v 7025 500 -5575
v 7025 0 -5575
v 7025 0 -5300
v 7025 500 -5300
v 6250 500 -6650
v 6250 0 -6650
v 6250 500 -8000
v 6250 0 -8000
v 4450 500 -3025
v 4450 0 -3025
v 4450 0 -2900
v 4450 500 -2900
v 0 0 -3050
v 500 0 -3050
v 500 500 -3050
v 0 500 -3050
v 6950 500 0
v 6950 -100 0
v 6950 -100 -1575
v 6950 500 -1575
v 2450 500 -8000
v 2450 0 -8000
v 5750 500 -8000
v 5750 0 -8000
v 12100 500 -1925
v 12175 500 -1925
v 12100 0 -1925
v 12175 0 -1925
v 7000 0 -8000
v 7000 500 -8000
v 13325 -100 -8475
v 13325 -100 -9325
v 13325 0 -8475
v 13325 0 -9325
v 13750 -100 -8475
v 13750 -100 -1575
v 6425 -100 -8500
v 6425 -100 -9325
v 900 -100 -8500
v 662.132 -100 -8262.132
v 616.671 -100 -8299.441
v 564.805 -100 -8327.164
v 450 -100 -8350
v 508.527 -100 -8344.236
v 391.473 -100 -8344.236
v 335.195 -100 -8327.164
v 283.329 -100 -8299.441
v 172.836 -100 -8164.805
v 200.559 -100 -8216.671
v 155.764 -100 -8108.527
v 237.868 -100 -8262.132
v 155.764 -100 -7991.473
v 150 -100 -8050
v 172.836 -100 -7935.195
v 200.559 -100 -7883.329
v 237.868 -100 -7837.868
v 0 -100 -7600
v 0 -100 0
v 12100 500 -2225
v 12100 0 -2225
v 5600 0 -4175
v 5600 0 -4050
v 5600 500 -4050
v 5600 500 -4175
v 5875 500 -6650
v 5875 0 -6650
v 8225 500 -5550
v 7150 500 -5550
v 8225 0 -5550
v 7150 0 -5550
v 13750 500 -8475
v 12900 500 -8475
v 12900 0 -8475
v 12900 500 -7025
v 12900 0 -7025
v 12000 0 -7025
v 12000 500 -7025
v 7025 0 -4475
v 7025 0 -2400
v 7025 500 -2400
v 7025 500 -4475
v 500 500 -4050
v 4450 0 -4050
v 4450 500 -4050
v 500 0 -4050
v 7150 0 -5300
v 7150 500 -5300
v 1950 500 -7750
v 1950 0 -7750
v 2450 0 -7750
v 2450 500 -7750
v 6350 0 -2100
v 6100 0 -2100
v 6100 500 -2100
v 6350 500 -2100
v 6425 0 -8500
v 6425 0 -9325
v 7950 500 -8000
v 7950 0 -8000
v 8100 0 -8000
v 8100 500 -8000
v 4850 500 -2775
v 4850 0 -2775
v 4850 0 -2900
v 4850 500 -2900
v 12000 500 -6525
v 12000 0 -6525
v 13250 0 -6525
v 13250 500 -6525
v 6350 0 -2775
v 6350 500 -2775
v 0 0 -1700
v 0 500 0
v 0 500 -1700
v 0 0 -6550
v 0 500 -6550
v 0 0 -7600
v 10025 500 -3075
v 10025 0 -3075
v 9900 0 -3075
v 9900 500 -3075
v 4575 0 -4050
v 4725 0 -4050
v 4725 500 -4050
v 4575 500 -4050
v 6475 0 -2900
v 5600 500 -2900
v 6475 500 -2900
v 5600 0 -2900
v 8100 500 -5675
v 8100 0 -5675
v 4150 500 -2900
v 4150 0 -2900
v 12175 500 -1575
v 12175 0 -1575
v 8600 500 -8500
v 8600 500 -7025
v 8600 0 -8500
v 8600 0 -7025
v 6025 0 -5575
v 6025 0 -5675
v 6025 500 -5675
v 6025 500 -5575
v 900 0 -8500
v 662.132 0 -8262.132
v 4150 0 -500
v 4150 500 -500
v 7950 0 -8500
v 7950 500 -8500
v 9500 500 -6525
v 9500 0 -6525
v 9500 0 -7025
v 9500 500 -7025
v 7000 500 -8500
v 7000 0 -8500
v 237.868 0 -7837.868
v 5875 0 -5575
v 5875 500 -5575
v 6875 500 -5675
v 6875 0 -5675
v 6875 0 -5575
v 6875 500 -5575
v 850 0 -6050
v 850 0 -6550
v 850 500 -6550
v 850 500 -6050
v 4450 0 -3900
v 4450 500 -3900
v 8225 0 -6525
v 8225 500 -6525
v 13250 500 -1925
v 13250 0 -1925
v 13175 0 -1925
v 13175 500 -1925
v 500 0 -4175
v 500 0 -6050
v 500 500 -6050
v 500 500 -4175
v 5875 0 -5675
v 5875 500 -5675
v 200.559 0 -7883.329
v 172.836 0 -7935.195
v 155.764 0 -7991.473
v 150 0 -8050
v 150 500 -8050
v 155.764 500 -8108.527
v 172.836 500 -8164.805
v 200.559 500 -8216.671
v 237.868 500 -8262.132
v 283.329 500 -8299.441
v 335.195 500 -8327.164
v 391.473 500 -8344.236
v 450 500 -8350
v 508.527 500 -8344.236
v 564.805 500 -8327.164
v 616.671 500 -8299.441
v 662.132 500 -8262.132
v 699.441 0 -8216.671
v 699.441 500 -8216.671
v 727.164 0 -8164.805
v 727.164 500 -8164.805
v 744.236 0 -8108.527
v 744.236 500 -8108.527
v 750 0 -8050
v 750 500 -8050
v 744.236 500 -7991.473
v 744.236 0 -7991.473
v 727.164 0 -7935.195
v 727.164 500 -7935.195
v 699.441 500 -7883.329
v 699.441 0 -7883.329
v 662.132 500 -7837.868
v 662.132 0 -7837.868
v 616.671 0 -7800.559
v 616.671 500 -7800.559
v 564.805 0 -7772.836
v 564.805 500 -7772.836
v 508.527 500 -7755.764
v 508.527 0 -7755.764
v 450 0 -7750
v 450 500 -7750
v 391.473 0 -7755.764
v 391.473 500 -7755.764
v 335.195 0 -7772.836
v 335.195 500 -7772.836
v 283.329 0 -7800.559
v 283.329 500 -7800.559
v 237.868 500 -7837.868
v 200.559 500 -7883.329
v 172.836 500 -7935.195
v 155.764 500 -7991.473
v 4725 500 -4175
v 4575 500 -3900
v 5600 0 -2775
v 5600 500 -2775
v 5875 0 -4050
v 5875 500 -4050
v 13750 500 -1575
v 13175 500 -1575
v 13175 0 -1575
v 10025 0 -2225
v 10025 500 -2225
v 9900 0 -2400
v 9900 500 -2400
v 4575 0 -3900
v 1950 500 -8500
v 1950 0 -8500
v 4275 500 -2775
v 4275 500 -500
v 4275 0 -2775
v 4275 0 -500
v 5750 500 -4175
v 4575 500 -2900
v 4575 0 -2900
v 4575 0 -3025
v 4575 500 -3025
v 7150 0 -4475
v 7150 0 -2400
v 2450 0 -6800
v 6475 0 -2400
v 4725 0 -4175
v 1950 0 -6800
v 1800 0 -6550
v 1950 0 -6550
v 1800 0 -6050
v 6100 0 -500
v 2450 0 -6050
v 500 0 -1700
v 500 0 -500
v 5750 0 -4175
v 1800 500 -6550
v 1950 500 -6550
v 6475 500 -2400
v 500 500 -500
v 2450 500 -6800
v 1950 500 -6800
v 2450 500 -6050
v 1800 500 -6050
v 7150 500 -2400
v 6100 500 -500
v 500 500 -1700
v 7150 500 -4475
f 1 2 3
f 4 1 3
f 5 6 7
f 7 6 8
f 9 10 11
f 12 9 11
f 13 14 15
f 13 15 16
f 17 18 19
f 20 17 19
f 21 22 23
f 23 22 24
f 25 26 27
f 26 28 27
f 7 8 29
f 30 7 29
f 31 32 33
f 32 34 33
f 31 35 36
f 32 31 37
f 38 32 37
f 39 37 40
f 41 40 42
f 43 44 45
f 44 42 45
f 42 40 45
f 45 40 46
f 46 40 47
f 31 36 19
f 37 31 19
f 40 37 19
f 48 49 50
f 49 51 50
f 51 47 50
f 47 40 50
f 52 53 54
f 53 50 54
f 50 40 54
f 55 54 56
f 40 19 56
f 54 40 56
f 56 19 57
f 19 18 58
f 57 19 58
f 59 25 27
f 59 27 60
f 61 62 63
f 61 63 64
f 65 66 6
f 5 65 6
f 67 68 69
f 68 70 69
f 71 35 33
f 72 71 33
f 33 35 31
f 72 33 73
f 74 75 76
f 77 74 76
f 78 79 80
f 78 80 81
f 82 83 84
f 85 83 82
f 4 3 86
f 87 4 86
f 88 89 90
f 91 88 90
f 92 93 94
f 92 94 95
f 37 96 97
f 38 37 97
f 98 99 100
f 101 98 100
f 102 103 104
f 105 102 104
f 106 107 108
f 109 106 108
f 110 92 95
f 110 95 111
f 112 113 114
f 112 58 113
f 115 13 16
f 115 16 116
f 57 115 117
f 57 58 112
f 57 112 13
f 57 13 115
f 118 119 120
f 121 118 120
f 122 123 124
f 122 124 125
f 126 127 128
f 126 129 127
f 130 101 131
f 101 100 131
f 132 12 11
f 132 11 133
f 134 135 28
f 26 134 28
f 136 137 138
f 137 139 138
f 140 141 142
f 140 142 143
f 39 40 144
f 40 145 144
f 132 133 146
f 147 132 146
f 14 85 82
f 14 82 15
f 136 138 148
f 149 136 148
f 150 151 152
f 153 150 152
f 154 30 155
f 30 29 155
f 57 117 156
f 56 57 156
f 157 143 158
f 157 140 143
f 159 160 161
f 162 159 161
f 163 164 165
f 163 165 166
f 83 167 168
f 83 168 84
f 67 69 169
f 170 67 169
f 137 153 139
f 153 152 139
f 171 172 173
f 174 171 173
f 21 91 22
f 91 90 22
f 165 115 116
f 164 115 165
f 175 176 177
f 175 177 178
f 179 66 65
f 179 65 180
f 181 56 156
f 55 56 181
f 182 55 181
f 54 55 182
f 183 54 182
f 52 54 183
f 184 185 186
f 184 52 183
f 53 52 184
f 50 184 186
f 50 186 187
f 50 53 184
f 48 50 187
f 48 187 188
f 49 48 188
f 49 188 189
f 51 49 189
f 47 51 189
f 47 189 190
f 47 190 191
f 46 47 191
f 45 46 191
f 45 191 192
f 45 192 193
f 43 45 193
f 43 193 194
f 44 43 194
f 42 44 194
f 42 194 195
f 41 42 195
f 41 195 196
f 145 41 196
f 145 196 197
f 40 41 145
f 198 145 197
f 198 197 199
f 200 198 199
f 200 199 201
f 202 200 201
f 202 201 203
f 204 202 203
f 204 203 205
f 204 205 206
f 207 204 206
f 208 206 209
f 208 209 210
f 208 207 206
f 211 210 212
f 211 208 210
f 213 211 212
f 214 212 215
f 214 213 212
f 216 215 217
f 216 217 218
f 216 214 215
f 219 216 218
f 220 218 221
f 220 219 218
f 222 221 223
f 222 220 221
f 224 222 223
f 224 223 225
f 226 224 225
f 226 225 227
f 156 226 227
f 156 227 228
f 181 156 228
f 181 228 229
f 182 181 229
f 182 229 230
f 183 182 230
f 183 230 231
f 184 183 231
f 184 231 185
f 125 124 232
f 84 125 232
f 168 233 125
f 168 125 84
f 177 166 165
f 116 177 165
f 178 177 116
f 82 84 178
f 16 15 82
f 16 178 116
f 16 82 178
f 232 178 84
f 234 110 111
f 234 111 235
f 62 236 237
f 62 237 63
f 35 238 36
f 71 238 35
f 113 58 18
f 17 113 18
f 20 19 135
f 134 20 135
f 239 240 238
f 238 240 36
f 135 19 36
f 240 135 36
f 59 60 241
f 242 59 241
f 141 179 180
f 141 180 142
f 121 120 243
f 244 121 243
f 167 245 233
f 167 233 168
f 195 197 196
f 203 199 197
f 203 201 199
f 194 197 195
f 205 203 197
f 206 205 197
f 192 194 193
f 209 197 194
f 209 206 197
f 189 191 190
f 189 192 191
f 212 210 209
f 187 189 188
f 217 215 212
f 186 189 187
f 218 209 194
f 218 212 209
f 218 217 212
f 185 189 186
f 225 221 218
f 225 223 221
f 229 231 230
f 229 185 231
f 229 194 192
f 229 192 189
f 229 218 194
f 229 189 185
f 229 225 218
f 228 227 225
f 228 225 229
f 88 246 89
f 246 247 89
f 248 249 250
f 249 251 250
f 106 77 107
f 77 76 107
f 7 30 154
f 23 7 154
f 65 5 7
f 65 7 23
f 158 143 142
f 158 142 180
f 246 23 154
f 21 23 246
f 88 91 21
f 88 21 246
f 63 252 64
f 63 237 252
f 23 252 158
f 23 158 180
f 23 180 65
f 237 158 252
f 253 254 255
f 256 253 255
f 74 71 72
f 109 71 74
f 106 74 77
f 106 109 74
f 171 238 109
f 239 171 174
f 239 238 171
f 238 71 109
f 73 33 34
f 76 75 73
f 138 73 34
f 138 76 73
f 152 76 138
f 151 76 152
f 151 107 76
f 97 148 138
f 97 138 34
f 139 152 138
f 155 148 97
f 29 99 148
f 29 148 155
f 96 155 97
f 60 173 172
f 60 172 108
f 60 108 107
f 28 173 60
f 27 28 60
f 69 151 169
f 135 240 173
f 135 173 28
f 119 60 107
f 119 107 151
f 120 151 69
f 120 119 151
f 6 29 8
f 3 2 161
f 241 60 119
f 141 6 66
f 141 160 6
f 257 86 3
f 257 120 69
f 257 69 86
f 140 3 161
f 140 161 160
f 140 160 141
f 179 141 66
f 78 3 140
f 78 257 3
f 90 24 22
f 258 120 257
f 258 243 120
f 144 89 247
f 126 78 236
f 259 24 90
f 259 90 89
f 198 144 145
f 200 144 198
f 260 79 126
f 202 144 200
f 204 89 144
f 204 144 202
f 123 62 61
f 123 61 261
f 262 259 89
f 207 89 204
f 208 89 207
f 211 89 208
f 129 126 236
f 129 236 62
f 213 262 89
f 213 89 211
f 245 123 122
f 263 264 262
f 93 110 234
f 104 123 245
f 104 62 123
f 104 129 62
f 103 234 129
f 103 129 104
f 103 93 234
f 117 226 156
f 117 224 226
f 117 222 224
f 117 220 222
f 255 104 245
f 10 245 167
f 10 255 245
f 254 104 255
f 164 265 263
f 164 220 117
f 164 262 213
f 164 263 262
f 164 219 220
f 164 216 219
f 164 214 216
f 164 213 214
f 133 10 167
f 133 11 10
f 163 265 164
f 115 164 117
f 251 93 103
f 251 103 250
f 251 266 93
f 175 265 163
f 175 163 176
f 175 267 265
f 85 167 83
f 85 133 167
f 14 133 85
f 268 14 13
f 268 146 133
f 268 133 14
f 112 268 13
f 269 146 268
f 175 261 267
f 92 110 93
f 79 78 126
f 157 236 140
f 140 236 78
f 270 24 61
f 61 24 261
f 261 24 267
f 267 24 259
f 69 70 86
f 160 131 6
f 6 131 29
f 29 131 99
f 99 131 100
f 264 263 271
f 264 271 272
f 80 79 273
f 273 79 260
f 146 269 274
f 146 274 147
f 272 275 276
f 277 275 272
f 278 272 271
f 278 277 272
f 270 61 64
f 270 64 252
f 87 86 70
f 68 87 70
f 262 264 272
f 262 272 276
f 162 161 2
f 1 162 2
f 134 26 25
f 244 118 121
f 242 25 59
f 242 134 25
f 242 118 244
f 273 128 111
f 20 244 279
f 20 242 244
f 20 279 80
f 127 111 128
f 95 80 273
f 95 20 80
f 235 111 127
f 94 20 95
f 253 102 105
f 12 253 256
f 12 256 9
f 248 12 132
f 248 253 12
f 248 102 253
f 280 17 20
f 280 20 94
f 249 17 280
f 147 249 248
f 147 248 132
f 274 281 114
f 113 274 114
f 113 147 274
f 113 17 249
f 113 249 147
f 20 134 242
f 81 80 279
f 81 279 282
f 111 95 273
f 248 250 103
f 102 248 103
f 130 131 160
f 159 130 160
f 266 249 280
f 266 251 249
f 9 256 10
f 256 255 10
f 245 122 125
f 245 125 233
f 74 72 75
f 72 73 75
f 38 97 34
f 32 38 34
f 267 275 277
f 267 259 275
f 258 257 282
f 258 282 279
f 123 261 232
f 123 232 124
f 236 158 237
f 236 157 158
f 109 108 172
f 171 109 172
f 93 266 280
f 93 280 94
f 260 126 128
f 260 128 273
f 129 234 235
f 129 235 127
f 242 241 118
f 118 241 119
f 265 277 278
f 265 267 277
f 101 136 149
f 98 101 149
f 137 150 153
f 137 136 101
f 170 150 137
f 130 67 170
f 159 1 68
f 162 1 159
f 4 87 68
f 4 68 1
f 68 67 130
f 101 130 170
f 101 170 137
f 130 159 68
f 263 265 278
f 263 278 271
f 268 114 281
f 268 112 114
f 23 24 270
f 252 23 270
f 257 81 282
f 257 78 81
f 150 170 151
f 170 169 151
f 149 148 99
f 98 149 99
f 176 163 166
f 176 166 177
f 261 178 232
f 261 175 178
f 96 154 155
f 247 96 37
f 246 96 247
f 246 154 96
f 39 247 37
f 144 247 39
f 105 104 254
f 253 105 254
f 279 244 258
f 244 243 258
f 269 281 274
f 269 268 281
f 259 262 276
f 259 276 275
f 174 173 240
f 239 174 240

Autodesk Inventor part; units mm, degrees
ref_plane "YZ Plane" through (0, 0, 0) normal (1, 0, 0) x (0, 1, 0)
ref_plane "XZ Plane" through (0, 0, 0) normal (0, 1, 0) x (-1, 0, 0)
ref_plane "XY Plane" through (0, 0, 0) normal (0, 0, 1) x (1, 0, 0)
sketch "Sketch1" plane through (0, 0, 0) normal (0, 1, 0) x (-1, 0, 0)
  line L0 (0, 0) -> (-6950, 0)
  line L1 (-6950, 0) -> (-6950, -1575)
  line L2 (-13750, -1575) -> (-13750, -8475)
  line L3 (-13750, -8475) -> (-12900, -8475)
  line L4 (-12900, -8475) -> (-12900, -7025)
  line L5 (-12900, -7025) -> (-12000, -7025)
  line L6 (-12000, -7025) -> (-12000, -6525)
  line L7 (-12000, -6525) -> (-13250, -6525)
  line L8 (-13250, -6525) -> (-13250, -1925)
  line L9 (-13250, -1925) -> (-13175, -1925)
  line L10 (-13175, -1925) -> (-13175, -1575)
  line L11 (-12175, -1575) -> (-12175, -1925)
  line L12 (-12175, -1925) -> (-12100, -1925)
  line L13 (-12100, -1925) -> (-12100, -2225)
  line L14 (-12100, -2225) -> (-10025, -2225)
  line L15 (-10025, -2225) -> (-10025, -2400)
  line L16 (-10025, -2400) -> (-6350, -2400)
  line L17 (0, 0) -> (0, -1700)
  line L18 (0, -1700) -> (-500, -1700)
  line L19 (-500, -1700) -> (-500, -500)
  line L20 (-500, -500) -> (-6100, -500)
  line L21 (-6100, -500) -> (-6100, -2100)
  line L22 (-6100, -2100) -> (-6350, -2100)
  line L23 (-6350, -2100) -> (-6350, -2400)
  line L24 (0, -3050) -> (0, -6550)
  line L25 (0, -6550) -> (-850, -6550)
  line L26 (-850, -6550) -> (-850, -6050)
  line L27 (-850, -6050) -> (-500, -6050)
  line L28 (-500, -6050) -> (-500, -3050)
  line L29 (-500, -3050) -> (0, -3050)
  line L30 (-1800, -6550) -> (-1950, -6550)
  line L31 (-1950, -6550) -> (-1950, -6800)
  line L32 (-1950, -6800) -> (-2450, -6800)
  line L33 (-2450, -6800) -> (-2450, -6050)
  line L34 (-2450, -6050) -> (-1800, -6050)
  line L35 (-1800, -6050) -> (-1800, -6550)
  line L36 (-1950, -7750) -> (-2450, -7750)
  line L37 (-2450, -7750) -> (-2450, -8000)
  line L38 (-2450, -8000) -> (-5750, -8000)
  line L39 (-5750, -8000) -> (-5750, -6650)
  line L40 (-5750, -6650) -> (-6250, -6650)
  line L41 (-6250, -6650) -> (-6250, -8000)
  line L42 (-6250, -8000) -> (-7000, -8000)
  line L43 (-7000, -8000) -> (-7000, -8500)
  line L44 (-7000, -8500) -> (-1950, -8500)
  line L45 (-1950, -8500) -> (-1950, -7750)
  line L46 (-7950, -8500) -> (-7950, -8000)
  line L47 (-7950, -8000) -> (-8100, -8000)
  line L48 (-8100, -8000) -> (-8100, -6525)
  line L49 (-8100, -6525) -> (-9500, -6525)
  line L50 (-9500, -6525) -> (-9500, -7025)
  line L51 (-9500, -7025) -> (-8600, -7025)
  line L52 (-8600, -7025) -> (-8600, -8500)
  line L53 (-8600, -8500) -> (-7950, -8500)
  line L54 (-6950, -1575) -> (-12175, -1575)
  line L55 (-13175, -1575) -> (-13750, -1575)
  line L56 (-4275, -500) -> (-4275, -2775)
  line L57 (-4275, -2775) -> (-4850, -2775)
  line L58 (-4850, -2775) -> (-4850, -2900)
  line L59 (-4850, -2900) -> (-4575, -2900)
  line L60 (-4575, -2900) -> (-4575, -3025)
  line L61 (-4575, -3025) -> (-4450, -3025)
  line L62 (-4450, -3025) -> (-4450, -2900)
  line L63 (-4450, -2900) -> (-4150, -2900)
  line L64 (-4150, -2900) -> (-4150, -500)
  line L65 (-6350, -2400) -> (-6350, -2775)
  line L66 (-6350, -2775) -> (-5600, -2775)
  line L67 (-5600, -2775) -> (-5600, -2900)
  line L68 (-5600, -2900) -> (-6475, -2900)
  line L69 (-6475, -2900) -> (-6475, -2400)
  line L70 (-7025, -2400) -> (-7025, -4475)
  line L71 (-7025, -4475) -> (-7150, -4475)
  line L72 (-7150, -4475) -> (-7150, -2400)
  line L73 (-8100, -6525) -> (-8100, -5675)
  line L74 (-8100, -5675) -> (-6875, -5675)
  line L75 (-6875, -5675) -> (-6875, -5575)
  line L76 (-6875, -5575) -> (-7025, -5575)
  line L77 (-7025, -5575) -> (-7025, -5300)
  line L78 (-7025, -5300) -> (-7150, -5300)
  line L79 (-7150, -5300) -> (-7150, -5550)
  line L80 (-8225, -5550) -> (-8225, -6525)
  line L81 (-7150, -5550) -> (-8225, -5550)
  line L82 (-5875, -6650) -> (-5875, -5675)
  line L83 (-5875, -5675) -> (-6025, -5675)
  line L84 (-6025, -5675) -> (-6025, -5575)
  line L85 (-6025, -5575) -> (-5875, -5575)
  line L86 (-5875, -5575) -> (-5875, -4050)
  line L87 (-5875, -4050) -> (-5600, -4050)
  line L88 (-5600, -4050) -> (-5600, -4175)
  line L89 (-5600, -4175) -> (-5750, -4175)
  line L90 (-5750, -4175) -> (-5750, -6650)
  line L91 (-500, -4175) -> (-4725, -4175)
  line L92 (-4725, -4175) -> (-4725, -4050)
  line L93 (-4725, -4050) -> (-4575, -4050)
  line L94 (-4575, -4050) -> (-4575, -3900)
  line L95 (-4575, -3900) -> (-4450, -3900)
  line L96 (-4450, -3900) -> (-4450, -4050)
  line L97 (-4450, -4050) -> (-500, -4050)
  line L98 (-4150, -2900) -> (-4275, -2775) construction
  line L99 (-6350, -2775) -> (-6475, -2900) construction
  line L100 (-5750, -4175) -> (-5875, -4050) construction
  line L101 (0, -3050) -> (0, -1700)
  line L102 (-12175, -1575) -> (-13175, -1575)
  line L103 (-12000, -7025) -> (-9500, -7025)
  line L104 (-7000, -8500) -> (-7950, -8500)
  line L105 (0, -6550) -> (0, -7600)
  line L106 (-900, -8500) -> (-1950, -8500)
  circle A0 centre (-450, -8050) radius 300
  line L107 (0, -7600) -> (-237.868, -7837.868)
  line L108 (-662.132, -8262.132) -> (-900, -8500)
  line L109 (-850, -6050) -> (-1800, -6050)
  line L110 (-2450, -6800) -> (-2450, -7750)
  line L111 (-500, -3050) -> (-500, -1700)
  line L112 (-7000, -8000) -> (-7950, -8000)
  line L113 (-850, -6550) -> (-1800, -6550)
  line L114 (-1950, -6800) -> (-1950, -7750)
  line L115 (-9500, -6525) -> (-12000, -6525)
  line L116 (-6425, -8500) -> (-6425, -9325)
  line L117 (-6425, -9325) -> (-13325, -9325)
  line L118 (-13325, -9325) -> (-13325, -8475)
  line L119 (-13200, -8475) -> (-13200, -9200)
  line L120 (-13200, -9200) -> (-6550, -9200)
  line L121 (-6550, -9200) -> (-6550, -8500)
  line L122 (-6425, -9325) -> (-6550, -9200) construction
  line L123 (-13200, -9200) -> (-13325, -9325) construction
  line L124 (-7075, -9325) -> (-7075, -9200)
  line L125 (-8100, -5675) -> (-8225, -5550) construction
  line L126 (-10025, -2400) -> (-10025, -3075)
  line L127 (-10025, -3075) -> (-9900, -3075)
  line L128 (-9900, -3075) -> (-9900, -2400)
  dimension "d0" = 1000
  dimension "d1" = 3225
  dimension "d2" = 13250
  dimension "d4" = 1150
  dimension "d5" = 6075
  dimension "d6" = 5600
  dimension "d7" = 500
  dimension "d8" = 1350
  dimension "d9" = 1200
  dimension "d10" = 500
  dimension "d11" = 1600
  dimension "d12" = 1900
  dimension "d13" = 5850
  dimension "d14" = 6000
  dimension "d15" = 4300
  dimension "d16" = 6900
  dimension "d17" = 500
  dimension "d18" = 350
  dimension "d19" = 300
  dimension "d20" = 175
  dimension "d21" = 650
  dimension "d22" = 850
  dimension "d23" = 5550
  dimension "d24" = 5250
  dimension "d25" = 950
  dimension "d26" = 350
  dimension "d27" = 650
  dimension "d28" = 750
  dimension "d29" = 950
  dimension "d30" = 1950
  dimension "d31" = 1350
  dimension "d32" = 750
  dimension "d33" = 950
  dimension "d34" = 1850
  dimension "d35" = 500
  dimension "d36" = 2500
  dimension "d37" = 1400
  dimension "d38" = 900
  dimension "d41" = 875
  dimension "d42" = 1150
  dimension "d43" = 150
  dimension "d44" = 3950
  dimension "d45" = 3550
  dimension "d46" = 125
  dimension "d47" = 875
  dimension "d48" = 750
  dimension "d49" = 1500
  dimension "d52" = 3650
  dimension "d53" = 1825
  dimension "d57" = 600
  dimension "d58" = 1500
  dimension "d59" = 450
  dimension "d60" = 125
  dimension "d61" = 650
  dimension "d62" = 825
  dimension "d65" = 975
  dimension "d66" = 850
  dimension "d67" = 150
  dimension "d68" = 1150
  dimension "d69" = 825
  dimension "d70" = 250
  dimension "d71" = 275
  dimension "d72" = 100
  dimension "d73" = 125
extrude "Extrusion1" add sketch "Sketch1" along normal blind 500 contours L17 L18 L19 L20 L21 L22 L23 L16 L15 L14 L13 L12 L11 L54 L1 L0 | L24 L25 L26 L27 L28 L29 | L10 L9 L8 L7 L6 L5 L4 L3 L2 L55 | L30 L31 L32 L33 L34 L35 | A0 | L45 L44 L43 L42 L41 L40 L39 L38 L37 L36 | L49 L48 L47 L46 L53 L52 L51 L50
extrude "Extrusion2" add sketch "Sketch1" along normal up to surface (500 mm away) contours L64 L63 L62 L61 L60 L59 L58 L57 L56 L20 | L28 L91 L92 L93 L94 L95 L96 L97 | L65 L66 L67 L68 L69 L16 | L16 L70 L71 L72 | L80 L81 L79 L78 L77 L76 L75 L74 L73 L49 | L40 L82 L83 L84 L85 L86 L87 L88 L89 L90
extrude "Extrusion3" add sketch "Sketch1" against normal blind 100
extrude "Extrusion4" add sketch "Sketch1" along normal up to surface (500 mm away) contours L16 L128 L127 L126
equation "\"d10\" = d7"
equation "\"d17\" = d10"
equation "\"d29\" = d25"
equation "\"d35\" = d7"
properties part number "Torre nel Verde 17"
